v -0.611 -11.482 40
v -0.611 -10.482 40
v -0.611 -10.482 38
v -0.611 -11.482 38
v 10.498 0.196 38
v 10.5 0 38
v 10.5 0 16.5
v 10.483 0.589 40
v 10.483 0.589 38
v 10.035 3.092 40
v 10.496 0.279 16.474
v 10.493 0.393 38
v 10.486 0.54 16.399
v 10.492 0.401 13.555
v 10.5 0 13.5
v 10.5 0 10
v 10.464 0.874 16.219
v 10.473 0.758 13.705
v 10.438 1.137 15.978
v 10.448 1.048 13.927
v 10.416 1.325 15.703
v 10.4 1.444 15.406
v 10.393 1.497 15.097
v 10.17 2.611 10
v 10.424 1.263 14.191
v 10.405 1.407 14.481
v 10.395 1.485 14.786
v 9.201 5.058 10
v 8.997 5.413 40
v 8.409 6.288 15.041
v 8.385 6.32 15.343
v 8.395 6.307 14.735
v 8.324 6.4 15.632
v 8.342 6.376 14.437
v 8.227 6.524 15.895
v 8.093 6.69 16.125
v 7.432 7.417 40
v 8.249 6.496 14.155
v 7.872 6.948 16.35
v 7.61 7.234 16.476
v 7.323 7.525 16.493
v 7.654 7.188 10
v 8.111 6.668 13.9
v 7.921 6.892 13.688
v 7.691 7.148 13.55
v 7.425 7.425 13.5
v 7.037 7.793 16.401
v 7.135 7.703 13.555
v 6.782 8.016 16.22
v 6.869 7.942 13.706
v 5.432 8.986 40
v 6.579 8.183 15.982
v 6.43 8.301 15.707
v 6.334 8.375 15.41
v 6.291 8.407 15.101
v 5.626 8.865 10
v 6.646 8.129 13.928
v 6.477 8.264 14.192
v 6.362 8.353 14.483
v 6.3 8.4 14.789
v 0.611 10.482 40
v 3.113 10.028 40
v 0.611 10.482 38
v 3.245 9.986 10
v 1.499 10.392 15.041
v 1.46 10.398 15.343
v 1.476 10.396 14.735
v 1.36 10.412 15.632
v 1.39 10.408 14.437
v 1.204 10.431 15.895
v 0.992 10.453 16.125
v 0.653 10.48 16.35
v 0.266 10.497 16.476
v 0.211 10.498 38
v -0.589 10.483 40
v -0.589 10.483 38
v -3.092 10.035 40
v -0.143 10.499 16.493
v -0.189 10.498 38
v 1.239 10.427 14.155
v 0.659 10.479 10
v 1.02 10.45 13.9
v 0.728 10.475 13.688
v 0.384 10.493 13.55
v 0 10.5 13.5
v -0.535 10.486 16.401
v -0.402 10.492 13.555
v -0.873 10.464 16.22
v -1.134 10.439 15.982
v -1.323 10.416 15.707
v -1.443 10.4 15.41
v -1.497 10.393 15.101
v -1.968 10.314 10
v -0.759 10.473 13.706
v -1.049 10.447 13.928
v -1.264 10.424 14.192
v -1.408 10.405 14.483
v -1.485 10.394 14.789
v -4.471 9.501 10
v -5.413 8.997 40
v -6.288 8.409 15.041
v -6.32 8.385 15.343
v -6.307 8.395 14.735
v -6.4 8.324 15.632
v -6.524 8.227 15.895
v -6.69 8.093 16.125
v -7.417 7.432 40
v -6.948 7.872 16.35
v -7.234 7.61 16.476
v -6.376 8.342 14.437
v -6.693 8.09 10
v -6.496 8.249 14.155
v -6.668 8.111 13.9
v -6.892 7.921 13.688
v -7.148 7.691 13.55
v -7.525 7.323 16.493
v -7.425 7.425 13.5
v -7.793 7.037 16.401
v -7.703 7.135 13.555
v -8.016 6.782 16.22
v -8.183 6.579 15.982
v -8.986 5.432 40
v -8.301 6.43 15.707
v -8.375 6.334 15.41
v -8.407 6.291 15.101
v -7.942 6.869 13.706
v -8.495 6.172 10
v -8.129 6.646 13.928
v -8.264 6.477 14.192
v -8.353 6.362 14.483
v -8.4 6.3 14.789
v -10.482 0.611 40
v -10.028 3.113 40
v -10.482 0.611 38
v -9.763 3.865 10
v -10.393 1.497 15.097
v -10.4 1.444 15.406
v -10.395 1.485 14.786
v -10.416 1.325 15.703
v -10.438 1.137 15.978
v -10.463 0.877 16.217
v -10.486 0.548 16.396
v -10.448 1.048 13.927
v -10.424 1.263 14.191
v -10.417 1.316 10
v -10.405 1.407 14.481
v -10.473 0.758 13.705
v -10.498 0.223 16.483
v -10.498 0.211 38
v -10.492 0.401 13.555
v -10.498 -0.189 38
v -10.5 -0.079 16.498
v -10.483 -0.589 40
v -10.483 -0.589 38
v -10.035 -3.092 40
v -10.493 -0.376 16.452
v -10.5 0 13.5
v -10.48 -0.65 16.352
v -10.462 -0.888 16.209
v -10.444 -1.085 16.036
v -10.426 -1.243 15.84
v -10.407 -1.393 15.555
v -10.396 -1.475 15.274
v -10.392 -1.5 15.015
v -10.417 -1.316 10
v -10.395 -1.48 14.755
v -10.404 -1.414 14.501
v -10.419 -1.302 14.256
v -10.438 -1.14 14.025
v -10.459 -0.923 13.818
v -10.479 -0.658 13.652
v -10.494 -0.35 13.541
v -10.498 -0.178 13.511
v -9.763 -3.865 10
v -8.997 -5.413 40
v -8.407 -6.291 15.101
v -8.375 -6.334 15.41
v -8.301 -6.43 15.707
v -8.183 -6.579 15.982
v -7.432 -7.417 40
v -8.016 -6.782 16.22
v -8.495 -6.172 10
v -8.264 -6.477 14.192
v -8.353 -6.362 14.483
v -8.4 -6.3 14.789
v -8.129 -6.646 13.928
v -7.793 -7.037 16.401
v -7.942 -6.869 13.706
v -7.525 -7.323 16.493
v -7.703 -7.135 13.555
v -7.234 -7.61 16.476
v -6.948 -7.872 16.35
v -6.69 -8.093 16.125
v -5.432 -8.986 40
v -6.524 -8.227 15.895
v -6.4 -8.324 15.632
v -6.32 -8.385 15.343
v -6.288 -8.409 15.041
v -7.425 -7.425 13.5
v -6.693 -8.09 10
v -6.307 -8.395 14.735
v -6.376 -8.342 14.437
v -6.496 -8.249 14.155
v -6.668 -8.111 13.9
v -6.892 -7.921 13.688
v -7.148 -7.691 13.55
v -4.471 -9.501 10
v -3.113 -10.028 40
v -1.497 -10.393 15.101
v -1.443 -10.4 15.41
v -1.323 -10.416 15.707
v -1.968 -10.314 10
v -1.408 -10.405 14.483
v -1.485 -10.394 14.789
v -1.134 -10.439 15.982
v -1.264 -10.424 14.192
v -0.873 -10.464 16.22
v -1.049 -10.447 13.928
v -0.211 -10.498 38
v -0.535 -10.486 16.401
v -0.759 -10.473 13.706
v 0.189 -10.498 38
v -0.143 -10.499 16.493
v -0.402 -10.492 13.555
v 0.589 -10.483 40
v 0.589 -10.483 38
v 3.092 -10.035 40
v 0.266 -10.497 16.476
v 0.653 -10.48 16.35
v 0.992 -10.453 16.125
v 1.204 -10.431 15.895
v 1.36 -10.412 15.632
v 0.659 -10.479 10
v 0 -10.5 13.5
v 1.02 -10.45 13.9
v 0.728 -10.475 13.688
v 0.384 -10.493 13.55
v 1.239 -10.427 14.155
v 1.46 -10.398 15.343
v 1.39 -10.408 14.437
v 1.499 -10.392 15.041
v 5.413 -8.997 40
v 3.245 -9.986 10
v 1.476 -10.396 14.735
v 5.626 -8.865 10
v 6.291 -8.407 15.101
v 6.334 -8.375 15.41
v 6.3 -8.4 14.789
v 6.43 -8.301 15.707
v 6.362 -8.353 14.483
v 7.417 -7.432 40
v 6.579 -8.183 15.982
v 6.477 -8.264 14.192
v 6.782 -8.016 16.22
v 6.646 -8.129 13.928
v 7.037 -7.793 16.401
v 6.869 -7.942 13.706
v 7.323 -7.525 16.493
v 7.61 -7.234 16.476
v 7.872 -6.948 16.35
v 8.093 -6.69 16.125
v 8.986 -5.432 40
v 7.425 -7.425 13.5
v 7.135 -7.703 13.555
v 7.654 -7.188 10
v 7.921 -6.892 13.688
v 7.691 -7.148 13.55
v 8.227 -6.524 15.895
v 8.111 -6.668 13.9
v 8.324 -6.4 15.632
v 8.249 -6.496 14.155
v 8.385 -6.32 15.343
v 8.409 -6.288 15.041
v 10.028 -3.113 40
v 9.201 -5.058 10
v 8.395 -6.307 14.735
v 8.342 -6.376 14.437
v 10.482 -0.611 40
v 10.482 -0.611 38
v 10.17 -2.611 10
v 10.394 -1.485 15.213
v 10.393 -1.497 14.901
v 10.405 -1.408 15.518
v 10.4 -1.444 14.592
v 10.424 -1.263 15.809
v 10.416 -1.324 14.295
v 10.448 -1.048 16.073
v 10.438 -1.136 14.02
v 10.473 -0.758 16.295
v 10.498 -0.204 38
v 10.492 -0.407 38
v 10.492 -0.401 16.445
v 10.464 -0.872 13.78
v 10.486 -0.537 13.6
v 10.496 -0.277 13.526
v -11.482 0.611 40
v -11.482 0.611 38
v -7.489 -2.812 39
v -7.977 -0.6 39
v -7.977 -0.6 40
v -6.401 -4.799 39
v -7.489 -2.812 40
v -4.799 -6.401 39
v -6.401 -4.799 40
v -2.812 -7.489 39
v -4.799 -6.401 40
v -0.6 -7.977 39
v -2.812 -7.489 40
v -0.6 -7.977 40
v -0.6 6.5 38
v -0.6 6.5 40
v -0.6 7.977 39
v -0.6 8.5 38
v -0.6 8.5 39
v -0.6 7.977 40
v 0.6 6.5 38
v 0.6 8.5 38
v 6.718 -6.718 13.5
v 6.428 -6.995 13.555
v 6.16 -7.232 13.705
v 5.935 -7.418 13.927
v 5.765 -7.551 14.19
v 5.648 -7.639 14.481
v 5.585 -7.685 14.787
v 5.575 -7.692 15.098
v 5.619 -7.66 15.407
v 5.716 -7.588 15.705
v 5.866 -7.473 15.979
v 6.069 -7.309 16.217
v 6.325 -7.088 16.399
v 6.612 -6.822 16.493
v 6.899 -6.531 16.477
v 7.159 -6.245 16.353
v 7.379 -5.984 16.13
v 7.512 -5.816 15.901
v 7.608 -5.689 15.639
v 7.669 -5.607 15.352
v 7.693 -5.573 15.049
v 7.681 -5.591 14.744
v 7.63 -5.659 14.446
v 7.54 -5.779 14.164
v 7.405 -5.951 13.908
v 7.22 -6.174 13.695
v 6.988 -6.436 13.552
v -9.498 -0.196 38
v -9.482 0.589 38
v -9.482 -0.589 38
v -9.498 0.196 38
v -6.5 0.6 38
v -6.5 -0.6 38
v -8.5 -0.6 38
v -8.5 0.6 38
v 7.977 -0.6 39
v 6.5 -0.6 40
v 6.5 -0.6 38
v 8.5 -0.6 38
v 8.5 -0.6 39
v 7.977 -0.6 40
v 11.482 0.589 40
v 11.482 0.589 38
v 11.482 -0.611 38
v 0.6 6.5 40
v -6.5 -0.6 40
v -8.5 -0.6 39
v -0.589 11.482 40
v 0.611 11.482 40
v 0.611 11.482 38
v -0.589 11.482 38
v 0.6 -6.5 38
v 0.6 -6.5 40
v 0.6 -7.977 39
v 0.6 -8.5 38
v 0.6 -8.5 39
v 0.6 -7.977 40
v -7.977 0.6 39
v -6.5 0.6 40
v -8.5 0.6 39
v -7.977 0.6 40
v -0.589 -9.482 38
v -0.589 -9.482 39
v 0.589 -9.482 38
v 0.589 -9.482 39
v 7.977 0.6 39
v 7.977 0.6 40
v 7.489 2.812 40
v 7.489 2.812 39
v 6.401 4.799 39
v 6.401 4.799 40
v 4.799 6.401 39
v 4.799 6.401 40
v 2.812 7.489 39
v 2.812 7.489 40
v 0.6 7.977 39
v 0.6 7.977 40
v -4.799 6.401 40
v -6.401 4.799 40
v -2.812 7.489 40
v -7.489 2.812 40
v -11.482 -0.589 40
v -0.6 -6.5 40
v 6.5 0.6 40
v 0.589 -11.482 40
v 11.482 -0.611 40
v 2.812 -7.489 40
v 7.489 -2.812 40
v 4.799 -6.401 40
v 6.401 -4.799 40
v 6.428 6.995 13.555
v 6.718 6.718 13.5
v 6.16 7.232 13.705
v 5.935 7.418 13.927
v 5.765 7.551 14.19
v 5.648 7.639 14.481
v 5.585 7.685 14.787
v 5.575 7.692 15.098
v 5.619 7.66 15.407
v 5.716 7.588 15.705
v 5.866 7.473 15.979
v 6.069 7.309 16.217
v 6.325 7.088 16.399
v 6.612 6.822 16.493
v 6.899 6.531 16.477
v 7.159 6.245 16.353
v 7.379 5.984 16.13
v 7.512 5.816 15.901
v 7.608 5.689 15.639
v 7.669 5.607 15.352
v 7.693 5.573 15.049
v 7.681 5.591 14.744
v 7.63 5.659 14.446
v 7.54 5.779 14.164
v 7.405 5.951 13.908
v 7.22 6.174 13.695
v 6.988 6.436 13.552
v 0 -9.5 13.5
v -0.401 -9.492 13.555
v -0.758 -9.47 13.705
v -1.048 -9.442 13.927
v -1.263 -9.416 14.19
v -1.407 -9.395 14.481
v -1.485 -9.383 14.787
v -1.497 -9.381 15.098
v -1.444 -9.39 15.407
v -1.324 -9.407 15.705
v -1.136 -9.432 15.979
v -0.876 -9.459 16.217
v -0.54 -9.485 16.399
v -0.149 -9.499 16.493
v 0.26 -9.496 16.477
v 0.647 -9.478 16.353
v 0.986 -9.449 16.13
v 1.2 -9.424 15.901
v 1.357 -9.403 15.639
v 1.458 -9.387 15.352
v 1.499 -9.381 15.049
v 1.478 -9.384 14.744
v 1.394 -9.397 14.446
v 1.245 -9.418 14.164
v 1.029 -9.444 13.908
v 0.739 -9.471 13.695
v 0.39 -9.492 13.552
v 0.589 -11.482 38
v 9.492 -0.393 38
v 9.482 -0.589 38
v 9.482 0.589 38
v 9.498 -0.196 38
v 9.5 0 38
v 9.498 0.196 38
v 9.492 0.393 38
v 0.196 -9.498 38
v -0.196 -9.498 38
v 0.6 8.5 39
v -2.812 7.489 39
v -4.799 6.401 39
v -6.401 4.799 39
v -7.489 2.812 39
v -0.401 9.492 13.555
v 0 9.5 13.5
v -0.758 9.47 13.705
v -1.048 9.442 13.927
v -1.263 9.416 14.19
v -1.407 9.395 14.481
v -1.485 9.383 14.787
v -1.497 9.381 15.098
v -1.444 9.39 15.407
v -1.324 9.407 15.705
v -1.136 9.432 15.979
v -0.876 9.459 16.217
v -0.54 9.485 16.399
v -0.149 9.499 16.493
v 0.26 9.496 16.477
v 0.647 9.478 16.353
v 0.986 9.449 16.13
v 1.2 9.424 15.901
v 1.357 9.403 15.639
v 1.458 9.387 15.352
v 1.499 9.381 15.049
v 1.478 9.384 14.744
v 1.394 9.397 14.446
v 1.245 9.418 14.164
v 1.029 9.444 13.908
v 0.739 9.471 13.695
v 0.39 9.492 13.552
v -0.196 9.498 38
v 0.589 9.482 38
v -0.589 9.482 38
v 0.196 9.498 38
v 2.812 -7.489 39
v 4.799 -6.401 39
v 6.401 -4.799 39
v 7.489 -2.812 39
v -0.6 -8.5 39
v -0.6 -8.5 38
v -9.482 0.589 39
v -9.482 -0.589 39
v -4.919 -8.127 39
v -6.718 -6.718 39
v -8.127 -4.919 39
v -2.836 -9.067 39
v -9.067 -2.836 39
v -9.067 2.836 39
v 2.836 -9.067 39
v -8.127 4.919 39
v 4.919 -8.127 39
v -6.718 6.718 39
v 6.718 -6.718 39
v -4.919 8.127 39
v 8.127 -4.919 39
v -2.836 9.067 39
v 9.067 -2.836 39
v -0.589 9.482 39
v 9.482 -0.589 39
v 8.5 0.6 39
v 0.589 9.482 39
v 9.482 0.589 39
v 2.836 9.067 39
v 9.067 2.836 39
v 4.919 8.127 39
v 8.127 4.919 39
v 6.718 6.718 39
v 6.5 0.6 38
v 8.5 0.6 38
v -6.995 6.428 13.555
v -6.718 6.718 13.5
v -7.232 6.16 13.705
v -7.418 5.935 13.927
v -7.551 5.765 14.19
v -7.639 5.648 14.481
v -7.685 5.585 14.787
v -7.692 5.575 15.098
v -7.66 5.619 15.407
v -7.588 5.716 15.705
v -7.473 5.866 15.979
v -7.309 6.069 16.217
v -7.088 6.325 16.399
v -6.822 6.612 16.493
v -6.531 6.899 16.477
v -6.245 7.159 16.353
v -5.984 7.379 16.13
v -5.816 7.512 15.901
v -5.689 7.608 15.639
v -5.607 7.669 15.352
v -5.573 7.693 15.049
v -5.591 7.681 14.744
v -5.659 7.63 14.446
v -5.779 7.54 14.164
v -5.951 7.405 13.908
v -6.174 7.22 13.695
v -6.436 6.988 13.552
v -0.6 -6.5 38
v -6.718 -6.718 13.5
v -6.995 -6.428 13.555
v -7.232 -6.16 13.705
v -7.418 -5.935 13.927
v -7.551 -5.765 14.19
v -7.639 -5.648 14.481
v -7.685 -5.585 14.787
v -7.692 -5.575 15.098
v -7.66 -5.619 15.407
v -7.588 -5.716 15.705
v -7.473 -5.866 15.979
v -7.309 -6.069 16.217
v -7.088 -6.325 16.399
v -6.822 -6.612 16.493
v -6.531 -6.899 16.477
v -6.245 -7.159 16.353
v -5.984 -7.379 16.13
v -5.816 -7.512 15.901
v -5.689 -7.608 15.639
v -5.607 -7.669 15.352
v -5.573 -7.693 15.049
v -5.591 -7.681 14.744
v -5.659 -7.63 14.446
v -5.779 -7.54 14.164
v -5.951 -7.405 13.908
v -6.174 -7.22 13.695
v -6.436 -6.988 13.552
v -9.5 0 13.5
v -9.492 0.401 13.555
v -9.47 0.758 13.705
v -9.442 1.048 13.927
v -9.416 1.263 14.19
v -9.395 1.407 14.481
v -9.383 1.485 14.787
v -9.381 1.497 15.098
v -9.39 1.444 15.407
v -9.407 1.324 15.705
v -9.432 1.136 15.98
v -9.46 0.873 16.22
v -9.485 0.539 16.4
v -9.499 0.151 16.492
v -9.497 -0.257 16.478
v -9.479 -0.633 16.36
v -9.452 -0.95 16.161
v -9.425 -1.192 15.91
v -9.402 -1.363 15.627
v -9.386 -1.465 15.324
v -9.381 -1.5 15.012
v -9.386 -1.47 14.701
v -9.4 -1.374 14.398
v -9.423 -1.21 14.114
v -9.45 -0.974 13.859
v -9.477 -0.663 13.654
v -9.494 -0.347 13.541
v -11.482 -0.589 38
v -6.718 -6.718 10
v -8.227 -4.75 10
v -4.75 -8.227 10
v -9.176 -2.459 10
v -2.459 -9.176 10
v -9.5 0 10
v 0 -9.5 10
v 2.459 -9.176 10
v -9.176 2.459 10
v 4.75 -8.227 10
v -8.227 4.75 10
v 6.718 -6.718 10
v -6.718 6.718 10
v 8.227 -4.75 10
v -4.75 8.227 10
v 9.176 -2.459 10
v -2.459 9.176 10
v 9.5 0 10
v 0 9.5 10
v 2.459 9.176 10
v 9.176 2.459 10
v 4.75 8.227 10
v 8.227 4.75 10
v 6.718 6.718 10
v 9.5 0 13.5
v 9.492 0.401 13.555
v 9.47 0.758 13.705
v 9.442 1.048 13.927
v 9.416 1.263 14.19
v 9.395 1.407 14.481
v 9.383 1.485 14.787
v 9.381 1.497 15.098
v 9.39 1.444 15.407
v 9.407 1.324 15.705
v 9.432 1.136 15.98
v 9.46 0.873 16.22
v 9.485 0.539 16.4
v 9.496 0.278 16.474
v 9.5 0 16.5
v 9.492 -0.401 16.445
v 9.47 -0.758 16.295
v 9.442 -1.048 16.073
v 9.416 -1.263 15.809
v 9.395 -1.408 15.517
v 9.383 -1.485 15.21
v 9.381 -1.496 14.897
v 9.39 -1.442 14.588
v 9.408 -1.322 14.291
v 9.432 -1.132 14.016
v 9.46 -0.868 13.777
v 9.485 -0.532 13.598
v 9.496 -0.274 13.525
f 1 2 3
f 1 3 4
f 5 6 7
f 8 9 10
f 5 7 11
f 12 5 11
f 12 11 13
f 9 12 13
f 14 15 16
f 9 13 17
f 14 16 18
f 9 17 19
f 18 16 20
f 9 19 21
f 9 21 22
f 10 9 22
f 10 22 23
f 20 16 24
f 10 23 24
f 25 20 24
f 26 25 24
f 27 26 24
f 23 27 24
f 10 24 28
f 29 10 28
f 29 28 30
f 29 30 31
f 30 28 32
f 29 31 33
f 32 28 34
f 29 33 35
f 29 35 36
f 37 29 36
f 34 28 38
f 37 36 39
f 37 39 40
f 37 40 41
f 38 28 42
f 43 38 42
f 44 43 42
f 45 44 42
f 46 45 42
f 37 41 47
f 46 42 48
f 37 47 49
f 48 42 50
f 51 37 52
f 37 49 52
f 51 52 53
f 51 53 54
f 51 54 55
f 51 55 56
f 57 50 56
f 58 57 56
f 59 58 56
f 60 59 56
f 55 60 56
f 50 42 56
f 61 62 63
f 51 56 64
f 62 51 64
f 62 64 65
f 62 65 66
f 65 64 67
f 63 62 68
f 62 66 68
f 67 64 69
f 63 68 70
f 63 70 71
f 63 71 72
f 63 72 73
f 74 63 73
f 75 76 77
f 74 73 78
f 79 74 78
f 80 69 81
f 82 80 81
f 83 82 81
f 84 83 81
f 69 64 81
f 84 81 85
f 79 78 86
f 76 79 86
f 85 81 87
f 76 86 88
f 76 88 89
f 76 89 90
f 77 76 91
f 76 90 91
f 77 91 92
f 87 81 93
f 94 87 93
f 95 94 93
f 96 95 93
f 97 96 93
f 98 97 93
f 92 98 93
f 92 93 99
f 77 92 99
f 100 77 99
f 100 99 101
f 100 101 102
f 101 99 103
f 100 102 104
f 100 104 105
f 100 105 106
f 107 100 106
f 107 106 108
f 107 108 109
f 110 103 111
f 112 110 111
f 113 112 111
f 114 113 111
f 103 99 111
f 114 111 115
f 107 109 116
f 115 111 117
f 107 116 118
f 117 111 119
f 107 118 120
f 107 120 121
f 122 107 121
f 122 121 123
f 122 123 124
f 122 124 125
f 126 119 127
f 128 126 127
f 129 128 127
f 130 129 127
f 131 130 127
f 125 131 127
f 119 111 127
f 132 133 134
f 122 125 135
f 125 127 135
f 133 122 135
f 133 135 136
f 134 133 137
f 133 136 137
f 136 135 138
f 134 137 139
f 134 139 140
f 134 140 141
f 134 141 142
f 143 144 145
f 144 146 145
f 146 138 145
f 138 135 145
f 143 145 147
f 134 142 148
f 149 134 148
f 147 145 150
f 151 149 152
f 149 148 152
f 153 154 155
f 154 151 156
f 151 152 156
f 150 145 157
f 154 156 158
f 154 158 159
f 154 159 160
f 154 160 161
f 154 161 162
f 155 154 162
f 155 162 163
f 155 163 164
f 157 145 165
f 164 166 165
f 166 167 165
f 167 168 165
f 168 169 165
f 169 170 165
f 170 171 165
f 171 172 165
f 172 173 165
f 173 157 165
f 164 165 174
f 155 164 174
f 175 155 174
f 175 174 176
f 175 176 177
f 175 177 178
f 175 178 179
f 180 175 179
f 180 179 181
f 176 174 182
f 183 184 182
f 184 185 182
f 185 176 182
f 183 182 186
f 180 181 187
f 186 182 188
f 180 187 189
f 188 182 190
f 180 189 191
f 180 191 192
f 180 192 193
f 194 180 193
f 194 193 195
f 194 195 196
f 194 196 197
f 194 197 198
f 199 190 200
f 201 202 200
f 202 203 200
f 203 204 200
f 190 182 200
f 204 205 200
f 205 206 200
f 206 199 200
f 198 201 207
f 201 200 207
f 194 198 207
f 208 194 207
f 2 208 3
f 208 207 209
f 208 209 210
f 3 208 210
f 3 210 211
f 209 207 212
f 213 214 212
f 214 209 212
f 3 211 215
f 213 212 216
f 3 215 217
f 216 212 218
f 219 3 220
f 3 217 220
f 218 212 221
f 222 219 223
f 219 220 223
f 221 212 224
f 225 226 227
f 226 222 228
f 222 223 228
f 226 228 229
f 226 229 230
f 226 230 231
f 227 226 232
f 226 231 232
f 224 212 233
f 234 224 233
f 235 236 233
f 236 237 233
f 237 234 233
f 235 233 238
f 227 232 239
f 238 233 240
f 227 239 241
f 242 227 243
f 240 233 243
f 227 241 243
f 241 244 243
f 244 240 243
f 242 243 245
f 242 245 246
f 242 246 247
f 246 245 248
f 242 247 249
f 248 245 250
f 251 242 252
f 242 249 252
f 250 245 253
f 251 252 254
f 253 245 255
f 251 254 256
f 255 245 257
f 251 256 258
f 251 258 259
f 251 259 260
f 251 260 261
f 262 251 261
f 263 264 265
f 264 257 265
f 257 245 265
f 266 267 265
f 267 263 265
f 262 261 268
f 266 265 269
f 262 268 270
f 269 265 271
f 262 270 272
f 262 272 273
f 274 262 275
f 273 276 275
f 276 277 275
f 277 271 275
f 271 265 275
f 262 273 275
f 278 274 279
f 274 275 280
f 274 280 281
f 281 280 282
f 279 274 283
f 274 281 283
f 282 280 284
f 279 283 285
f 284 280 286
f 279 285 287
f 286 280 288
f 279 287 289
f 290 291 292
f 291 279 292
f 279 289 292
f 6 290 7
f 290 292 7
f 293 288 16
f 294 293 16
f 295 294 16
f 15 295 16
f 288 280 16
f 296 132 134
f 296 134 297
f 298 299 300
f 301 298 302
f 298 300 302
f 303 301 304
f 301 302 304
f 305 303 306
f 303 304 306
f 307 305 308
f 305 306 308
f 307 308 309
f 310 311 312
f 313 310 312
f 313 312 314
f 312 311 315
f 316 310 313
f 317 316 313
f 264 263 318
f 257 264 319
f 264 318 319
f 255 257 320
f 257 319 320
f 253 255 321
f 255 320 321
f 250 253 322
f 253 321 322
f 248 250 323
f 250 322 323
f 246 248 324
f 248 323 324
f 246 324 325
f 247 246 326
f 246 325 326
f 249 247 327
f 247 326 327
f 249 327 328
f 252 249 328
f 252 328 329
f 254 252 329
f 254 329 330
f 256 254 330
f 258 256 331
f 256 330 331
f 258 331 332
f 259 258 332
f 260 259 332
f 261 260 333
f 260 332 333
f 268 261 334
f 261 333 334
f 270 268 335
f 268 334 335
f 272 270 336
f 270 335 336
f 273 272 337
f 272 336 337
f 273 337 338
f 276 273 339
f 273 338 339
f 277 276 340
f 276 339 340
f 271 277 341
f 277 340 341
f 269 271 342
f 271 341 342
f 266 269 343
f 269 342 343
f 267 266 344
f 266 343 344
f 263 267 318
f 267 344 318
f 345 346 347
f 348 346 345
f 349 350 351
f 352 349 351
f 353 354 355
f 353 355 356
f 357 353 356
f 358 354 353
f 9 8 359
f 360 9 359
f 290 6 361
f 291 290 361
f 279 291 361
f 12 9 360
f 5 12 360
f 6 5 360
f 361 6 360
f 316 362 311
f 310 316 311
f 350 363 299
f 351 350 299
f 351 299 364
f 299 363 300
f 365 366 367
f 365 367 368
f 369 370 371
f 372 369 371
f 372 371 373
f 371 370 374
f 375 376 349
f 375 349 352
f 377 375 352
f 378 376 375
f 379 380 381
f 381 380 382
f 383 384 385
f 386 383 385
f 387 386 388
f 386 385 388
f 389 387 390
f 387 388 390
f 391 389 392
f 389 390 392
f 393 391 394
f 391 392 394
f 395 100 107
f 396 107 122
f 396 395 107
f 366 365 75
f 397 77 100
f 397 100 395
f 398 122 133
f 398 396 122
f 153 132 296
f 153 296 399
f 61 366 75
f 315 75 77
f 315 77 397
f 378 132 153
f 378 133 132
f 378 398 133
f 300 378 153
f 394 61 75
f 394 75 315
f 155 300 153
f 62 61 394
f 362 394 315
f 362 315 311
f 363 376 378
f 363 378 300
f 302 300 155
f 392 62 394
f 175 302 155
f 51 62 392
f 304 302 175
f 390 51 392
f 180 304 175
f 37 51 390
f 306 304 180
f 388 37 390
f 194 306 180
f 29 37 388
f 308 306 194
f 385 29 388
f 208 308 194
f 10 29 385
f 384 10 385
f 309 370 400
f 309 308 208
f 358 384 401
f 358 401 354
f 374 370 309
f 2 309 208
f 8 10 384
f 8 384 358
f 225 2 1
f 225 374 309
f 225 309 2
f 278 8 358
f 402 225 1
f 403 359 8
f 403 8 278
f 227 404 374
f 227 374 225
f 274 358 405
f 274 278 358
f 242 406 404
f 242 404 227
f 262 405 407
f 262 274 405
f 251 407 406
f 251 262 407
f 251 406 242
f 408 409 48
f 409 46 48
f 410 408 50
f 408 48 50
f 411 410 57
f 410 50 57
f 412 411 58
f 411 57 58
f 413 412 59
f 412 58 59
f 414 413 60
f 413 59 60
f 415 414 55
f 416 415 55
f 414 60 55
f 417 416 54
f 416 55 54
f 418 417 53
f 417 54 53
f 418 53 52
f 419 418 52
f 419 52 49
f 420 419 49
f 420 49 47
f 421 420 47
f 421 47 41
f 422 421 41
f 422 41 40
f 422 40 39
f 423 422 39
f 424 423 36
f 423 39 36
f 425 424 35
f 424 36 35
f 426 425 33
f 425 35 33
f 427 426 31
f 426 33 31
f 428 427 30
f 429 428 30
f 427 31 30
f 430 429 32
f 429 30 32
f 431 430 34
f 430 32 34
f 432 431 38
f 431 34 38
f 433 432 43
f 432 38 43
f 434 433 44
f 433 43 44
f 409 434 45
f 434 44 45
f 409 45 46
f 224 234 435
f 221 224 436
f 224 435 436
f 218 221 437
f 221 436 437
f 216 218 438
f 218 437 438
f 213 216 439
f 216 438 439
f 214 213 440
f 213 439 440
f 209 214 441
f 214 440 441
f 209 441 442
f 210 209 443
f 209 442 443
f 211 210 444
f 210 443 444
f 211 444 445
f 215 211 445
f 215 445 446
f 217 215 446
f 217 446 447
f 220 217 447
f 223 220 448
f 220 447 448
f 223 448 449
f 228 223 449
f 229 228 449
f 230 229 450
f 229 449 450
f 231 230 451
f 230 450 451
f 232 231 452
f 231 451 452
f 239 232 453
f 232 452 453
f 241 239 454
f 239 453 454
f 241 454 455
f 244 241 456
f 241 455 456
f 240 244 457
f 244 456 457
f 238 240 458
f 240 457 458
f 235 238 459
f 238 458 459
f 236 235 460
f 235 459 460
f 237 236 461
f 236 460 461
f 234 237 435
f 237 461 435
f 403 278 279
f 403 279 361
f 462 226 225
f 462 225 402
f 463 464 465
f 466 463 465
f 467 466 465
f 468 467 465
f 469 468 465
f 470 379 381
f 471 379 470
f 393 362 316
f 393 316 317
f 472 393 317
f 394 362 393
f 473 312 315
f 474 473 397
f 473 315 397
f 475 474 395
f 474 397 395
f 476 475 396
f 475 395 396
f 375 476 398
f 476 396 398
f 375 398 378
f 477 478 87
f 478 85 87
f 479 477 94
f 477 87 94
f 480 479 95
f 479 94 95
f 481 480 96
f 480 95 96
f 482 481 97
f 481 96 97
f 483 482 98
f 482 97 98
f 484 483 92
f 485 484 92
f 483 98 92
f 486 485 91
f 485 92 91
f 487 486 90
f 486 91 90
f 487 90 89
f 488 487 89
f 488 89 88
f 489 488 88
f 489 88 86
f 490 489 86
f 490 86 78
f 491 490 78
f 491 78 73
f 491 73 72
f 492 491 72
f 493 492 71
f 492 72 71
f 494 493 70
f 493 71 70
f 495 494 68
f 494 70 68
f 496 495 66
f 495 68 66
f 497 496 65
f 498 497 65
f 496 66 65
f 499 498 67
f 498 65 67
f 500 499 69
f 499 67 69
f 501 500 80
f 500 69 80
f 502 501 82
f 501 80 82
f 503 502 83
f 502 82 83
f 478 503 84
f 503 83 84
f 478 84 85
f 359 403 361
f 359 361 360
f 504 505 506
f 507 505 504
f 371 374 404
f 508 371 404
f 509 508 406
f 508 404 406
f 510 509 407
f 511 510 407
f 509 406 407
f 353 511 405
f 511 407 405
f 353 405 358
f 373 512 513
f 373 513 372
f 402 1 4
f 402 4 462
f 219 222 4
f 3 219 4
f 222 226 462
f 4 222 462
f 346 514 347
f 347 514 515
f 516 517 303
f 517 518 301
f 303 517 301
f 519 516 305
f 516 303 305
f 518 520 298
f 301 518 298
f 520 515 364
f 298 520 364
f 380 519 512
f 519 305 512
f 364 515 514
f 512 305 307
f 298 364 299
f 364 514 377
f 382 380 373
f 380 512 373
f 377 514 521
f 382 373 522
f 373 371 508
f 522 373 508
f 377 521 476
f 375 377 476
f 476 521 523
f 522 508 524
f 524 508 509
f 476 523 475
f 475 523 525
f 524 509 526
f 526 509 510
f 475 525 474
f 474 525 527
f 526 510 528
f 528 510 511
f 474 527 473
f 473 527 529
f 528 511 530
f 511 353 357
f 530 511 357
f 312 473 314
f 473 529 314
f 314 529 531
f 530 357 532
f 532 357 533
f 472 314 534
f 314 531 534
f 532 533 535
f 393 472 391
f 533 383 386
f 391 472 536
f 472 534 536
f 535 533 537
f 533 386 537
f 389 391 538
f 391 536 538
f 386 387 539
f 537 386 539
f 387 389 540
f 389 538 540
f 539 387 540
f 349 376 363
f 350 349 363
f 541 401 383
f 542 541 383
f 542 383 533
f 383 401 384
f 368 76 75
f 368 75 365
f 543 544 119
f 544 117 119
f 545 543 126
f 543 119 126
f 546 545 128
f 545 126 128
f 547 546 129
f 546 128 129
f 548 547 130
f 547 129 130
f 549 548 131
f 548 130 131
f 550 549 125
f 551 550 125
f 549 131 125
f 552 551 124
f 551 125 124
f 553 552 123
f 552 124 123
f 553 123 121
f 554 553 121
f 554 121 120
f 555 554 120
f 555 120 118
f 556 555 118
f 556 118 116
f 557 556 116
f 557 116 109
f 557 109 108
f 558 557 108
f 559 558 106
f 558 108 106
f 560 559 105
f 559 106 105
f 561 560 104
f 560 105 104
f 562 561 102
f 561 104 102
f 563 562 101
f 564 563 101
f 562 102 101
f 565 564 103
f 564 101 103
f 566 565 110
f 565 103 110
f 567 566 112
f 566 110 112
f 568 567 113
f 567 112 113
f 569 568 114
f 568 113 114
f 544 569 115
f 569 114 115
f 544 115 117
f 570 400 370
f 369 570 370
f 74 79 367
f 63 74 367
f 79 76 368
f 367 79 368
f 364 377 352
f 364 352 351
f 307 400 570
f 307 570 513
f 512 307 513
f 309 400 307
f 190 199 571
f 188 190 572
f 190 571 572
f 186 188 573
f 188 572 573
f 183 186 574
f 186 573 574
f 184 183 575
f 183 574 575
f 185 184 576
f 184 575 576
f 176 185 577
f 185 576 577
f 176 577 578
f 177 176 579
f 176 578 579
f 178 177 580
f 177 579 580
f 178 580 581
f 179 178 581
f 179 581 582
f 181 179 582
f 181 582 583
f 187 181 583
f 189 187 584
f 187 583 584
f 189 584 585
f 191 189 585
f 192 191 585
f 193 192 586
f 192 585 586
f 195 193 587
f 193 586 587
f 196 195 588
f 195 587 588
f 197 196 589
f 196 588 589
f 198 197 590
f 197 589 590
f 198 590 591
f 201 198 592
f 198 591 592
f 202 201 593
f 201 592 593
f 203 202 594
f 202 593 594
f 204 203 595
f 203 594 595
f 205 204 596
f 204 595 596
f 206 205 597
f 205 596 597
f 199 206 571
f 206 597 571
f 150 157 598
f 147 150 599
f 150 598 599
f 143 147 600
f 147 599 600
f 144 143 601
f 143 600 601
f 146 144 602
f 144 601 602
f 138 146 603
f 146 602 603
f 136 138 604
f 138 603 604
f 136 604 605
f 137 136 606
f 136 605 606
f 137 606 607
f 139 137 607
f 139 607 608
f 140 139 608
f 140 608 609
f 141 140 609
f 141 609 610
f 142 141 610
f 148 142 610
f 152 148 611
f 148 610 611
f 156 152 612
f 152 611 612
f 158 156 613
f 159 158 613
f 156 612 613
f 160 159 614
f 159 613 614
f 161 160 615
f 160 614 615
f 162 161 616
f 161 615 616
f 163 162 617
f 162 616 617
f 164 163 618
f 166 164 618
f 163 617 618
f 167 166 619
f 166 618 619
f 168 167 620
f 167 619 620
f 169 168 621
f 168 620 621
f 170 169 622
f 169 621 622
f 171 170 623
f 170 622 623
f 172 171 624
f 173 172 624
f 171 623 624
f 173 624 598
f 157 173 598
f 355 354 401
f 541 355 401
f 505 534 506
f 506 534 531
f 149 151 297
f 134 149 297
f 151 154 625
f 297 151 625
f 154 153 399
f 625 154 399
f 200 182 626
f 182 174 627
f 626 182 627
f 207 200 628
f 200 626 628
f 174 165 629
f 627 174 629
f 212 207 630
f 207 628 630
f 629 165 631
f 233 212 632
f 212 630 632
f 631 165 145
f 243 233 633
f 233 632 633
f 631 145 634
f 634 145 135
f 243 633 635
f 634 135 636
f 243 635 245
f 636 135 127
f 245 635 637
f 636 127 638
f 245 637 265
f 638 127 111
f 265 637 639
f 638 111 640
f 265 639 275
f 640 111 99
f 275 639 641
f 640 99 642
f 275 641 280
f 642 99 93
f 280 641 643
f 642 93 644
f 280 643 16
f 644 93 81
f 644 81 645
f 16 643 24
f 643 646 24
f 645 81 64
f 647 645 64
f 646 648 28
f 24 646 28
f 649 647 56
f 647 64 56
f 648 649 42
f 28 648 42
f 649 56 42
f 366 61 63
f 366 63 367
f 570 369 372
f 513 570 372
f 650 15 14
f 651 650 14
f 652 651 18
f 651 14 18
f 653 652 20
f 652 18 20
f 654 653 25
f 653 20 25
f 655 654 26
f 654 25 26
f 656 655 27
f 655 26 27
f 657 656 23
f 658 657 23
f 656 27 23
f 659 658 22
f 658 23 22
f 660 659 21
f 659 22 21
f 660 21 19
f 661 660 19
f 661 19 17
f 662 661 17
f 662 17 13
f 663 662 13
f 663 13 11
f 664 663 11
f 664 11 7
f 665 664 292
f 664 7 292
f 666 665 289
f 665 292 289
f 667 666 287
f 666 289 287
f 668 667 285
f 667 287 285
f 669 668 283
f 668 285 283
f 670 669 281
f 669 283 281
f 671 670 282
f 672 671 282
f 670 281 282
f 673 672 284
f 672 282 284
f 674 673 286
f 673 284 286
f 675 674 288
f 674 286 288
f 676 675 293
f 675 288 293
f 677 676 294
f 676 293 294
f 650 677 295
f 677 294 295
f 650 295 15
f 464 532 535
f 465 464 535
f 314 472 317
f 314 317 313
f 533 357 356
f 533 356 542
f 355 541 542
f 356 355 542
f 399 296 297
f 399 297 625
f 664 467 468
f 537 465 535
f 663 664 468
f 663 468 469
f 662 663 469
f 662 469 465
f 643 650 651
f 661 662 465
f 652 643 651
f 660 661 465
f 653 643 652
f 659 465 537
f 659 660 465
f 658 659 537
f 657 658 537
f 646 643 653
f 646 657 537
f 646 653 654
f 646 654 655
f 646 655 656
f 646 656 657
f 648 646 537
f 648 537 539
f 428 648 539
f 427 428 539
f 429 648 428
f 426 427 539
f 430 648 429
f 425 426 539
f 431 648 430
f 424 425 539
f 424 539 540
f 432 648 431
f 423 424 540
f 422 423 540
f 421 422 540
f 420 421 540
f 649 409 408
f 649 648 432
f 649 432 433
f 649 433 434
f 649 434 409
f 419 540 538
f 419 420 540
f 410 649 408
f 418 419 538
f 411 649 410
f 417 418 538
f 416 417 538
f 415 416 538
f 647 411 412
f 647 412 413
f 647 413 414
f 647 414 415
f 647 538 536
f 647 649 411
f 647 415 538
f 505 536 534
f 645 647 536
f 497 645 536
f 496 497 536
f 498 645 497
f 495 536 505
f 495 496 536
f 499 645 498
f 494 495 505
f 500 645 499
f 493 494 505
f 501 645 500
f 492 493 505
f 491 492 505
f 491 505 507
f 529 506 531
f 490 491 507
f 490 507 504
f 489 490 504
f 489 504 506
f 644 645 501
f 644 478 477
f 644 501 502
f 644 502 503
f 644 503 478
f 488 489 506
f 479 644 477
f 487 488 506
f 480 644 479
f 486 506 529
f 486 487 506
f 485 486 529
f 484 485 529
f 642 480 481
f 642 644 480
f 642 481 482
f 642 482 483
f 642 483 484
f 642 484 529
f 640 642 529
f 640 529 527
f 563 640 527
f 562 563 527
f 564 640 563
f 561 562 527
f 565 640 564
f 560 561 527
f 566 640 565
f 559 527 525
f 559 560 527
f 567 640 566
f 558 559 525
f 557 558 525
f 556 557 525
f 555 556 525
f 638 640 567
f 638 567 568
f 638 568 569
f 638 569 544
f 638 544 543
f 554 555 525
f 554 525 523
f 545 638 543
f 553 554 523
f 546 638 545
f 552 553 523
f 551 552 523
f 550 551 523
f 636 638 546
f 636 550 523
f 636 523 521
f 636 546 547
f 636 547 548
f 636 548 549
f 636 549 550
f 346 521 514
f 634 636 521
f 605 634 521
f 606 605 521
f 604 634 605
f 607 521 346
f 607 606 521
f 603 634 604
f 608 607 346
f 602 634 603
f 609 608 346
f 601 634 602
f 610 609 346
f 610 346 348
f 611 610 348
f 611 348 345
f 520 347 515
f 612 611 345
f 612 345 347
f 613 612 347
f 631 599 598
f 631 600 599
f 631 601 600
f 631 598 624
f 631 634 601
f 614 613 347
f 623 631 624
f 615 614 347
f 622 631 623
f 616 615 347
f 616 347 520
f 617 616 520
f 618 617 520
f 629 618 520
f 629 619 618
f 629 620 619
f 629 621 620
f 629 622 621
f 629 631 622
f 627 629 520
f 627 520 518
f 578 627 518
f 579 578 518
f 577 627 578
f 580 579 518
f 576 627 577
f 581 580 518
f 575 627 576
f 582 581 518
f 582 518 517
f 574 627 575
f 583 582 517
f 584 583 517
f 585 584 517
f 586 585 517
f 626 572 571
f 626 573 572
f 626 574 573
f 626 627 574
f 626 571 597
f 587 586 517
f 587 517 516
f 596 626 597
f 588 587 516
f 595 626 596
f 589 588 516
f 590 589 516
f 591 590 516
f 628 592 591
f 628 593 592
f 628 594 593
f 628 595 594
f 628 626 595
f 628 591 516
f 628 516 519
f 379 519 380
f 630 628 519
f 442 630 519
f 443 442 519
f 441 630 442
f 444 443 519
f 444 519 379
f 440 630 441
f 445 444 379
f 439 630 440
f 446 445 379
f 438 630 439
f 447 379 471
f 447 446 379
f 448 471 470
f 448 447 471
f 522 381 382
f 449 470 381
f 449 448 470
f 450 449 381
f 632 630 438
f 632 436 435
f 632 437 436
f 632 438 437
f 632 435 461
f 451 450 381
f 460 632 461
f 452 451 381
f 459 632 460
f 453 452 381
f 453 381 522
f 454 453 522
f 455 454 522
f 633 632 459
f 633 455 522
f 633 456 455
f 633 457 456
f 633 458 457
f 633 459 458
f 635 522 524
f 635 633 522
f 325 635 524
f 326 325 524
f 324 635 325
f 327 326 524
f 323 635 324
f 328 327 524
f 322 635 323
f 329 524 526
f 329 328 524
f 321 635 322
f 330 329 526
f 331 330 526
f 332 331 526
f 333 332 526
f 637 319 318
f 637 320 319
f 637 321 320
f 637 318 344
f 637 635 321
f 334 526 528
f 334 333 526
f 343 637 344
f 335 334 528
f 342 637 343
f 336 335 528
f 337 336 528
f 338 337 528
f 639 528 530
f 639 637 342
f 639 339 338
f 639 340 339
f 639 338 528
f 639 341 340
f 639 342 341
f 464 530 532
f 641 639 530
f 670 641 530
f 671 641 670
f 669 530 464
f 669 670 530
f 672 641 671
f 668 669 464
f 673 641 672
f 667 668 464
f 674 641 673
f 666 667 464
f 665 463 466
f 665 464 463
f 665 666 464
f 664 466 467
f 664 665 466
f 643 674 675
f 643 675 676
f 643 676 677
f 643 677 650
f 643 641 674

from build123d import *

# Parameters (mm, degrees)
EXTRUDE_START            = 10
SKETCH_1_R               = 10.5
SKETCH_1_R_2             = 9.5
EXTRUDE_1_DEPTH          = 30
EXTRUDE_START_2          = 40
SKETCH_6_R               = 10
SKETCH_6_R_2             = 8
EXTRUDE_3_DEPTH          = 1
SKETCH_5_W               = 2
SKETCH_5_H               = 1.2
EXTRUDE_4_DEPTH          = 2
PATTERN_CIRCULAR_1_COUNT = 4
SKETCH_7_R               = 1.5
CUT_EXTRUDE_2_DEPTH      = 20
PATTERN_CIRCULAR_2_COUNT = 8


with BuildPart() as part:
    # ｽｹｯﾁ1 → ﾎﾞｽ - 押し出し1 (new body)
    with BuildSketch(Plane.XY.offset(EXTRUDE_START)):
        Circle(SKETCH_1_R)
        Circle(SKETCH_1_R_2, mode=Mode.SUBTRACT)
    extrude(amount=EXTRUDE_1_DEPTH)

    # ｽｹｯﾁ6 → ﾎﾞｽ - 押し出し3 (add)
    with BuildSketch(Plane.XY.offset(EXTRUDE_START_2)):
        Circle(SKETCH_6_R)
        Circle(SKETCH_6_R_2, mode=Mode.SUBTRACT)
    extrude(amount=-EXTRUDE_3_DEPTH)

    # ｽｹｯﾁ5 → ﾎﾞｽ - 押し出し4 (add)
    with BuildSketch(Plane.XY.offset(40)):
        with Locations((7.5, 0)):
            Rectangle(SKETCH_5_W, SKETCH_5_H)
        with Locations((10.48172138, -0.010967172)):
            Rectangle(SKETCH_5_W, SKETCH_5_H)
    extrude_4 = extrude(amount=-EXTRUDE_4_DEPTH)

    # 円形ﾊﾟﾀｰﾝ1: ﾎﾞｽ - 押し出し4 ×4 about axis
    pattern_circular_1_axis = Axis((0, 0, 0), (0, 0, 1))
    for i in range(1, PATTERN_CIRCULAR_1_COUNT):
        add(extrude_4.rotate(pattern_circular_1_axis, i * 360 / PATTERN_CIRCULAR_1_COUNT))

    # ｽｹｯﾁ7 → ｶｯﾄ - 押し出し2 (cut, symmetric)
    with BuildSketch(Plane(origin=(0, 0, 0), x_dir=(0, 0, -1), z_dir=(1, 0, 0))):
        with Locations((-15, 0)):
            Circle(SKETCH_7_R)
    cut_extrude_2 = extrude(amount=CUT_EXTRUDE_2_DEPTH, both=True, mode=Mode.SUBTRACT)

    # 円形ﾊﾟﾀｰﾝ2: ｶｯﾄ - 押し出し2 ×8 about axis
    pattern_circular_2_axis = Axis((0, 0, 39), (0, 0, 1))
    for i in range(1, PATTERN_CIRCULAR_2_COUNT):
        add(cut_extrude_2.rotate(pattern_circular_2_axis, i * 360 / PATTERN_CIRCULAR_2_COUNT), mode=Mode.SUBTRACT)


solid = part.part
